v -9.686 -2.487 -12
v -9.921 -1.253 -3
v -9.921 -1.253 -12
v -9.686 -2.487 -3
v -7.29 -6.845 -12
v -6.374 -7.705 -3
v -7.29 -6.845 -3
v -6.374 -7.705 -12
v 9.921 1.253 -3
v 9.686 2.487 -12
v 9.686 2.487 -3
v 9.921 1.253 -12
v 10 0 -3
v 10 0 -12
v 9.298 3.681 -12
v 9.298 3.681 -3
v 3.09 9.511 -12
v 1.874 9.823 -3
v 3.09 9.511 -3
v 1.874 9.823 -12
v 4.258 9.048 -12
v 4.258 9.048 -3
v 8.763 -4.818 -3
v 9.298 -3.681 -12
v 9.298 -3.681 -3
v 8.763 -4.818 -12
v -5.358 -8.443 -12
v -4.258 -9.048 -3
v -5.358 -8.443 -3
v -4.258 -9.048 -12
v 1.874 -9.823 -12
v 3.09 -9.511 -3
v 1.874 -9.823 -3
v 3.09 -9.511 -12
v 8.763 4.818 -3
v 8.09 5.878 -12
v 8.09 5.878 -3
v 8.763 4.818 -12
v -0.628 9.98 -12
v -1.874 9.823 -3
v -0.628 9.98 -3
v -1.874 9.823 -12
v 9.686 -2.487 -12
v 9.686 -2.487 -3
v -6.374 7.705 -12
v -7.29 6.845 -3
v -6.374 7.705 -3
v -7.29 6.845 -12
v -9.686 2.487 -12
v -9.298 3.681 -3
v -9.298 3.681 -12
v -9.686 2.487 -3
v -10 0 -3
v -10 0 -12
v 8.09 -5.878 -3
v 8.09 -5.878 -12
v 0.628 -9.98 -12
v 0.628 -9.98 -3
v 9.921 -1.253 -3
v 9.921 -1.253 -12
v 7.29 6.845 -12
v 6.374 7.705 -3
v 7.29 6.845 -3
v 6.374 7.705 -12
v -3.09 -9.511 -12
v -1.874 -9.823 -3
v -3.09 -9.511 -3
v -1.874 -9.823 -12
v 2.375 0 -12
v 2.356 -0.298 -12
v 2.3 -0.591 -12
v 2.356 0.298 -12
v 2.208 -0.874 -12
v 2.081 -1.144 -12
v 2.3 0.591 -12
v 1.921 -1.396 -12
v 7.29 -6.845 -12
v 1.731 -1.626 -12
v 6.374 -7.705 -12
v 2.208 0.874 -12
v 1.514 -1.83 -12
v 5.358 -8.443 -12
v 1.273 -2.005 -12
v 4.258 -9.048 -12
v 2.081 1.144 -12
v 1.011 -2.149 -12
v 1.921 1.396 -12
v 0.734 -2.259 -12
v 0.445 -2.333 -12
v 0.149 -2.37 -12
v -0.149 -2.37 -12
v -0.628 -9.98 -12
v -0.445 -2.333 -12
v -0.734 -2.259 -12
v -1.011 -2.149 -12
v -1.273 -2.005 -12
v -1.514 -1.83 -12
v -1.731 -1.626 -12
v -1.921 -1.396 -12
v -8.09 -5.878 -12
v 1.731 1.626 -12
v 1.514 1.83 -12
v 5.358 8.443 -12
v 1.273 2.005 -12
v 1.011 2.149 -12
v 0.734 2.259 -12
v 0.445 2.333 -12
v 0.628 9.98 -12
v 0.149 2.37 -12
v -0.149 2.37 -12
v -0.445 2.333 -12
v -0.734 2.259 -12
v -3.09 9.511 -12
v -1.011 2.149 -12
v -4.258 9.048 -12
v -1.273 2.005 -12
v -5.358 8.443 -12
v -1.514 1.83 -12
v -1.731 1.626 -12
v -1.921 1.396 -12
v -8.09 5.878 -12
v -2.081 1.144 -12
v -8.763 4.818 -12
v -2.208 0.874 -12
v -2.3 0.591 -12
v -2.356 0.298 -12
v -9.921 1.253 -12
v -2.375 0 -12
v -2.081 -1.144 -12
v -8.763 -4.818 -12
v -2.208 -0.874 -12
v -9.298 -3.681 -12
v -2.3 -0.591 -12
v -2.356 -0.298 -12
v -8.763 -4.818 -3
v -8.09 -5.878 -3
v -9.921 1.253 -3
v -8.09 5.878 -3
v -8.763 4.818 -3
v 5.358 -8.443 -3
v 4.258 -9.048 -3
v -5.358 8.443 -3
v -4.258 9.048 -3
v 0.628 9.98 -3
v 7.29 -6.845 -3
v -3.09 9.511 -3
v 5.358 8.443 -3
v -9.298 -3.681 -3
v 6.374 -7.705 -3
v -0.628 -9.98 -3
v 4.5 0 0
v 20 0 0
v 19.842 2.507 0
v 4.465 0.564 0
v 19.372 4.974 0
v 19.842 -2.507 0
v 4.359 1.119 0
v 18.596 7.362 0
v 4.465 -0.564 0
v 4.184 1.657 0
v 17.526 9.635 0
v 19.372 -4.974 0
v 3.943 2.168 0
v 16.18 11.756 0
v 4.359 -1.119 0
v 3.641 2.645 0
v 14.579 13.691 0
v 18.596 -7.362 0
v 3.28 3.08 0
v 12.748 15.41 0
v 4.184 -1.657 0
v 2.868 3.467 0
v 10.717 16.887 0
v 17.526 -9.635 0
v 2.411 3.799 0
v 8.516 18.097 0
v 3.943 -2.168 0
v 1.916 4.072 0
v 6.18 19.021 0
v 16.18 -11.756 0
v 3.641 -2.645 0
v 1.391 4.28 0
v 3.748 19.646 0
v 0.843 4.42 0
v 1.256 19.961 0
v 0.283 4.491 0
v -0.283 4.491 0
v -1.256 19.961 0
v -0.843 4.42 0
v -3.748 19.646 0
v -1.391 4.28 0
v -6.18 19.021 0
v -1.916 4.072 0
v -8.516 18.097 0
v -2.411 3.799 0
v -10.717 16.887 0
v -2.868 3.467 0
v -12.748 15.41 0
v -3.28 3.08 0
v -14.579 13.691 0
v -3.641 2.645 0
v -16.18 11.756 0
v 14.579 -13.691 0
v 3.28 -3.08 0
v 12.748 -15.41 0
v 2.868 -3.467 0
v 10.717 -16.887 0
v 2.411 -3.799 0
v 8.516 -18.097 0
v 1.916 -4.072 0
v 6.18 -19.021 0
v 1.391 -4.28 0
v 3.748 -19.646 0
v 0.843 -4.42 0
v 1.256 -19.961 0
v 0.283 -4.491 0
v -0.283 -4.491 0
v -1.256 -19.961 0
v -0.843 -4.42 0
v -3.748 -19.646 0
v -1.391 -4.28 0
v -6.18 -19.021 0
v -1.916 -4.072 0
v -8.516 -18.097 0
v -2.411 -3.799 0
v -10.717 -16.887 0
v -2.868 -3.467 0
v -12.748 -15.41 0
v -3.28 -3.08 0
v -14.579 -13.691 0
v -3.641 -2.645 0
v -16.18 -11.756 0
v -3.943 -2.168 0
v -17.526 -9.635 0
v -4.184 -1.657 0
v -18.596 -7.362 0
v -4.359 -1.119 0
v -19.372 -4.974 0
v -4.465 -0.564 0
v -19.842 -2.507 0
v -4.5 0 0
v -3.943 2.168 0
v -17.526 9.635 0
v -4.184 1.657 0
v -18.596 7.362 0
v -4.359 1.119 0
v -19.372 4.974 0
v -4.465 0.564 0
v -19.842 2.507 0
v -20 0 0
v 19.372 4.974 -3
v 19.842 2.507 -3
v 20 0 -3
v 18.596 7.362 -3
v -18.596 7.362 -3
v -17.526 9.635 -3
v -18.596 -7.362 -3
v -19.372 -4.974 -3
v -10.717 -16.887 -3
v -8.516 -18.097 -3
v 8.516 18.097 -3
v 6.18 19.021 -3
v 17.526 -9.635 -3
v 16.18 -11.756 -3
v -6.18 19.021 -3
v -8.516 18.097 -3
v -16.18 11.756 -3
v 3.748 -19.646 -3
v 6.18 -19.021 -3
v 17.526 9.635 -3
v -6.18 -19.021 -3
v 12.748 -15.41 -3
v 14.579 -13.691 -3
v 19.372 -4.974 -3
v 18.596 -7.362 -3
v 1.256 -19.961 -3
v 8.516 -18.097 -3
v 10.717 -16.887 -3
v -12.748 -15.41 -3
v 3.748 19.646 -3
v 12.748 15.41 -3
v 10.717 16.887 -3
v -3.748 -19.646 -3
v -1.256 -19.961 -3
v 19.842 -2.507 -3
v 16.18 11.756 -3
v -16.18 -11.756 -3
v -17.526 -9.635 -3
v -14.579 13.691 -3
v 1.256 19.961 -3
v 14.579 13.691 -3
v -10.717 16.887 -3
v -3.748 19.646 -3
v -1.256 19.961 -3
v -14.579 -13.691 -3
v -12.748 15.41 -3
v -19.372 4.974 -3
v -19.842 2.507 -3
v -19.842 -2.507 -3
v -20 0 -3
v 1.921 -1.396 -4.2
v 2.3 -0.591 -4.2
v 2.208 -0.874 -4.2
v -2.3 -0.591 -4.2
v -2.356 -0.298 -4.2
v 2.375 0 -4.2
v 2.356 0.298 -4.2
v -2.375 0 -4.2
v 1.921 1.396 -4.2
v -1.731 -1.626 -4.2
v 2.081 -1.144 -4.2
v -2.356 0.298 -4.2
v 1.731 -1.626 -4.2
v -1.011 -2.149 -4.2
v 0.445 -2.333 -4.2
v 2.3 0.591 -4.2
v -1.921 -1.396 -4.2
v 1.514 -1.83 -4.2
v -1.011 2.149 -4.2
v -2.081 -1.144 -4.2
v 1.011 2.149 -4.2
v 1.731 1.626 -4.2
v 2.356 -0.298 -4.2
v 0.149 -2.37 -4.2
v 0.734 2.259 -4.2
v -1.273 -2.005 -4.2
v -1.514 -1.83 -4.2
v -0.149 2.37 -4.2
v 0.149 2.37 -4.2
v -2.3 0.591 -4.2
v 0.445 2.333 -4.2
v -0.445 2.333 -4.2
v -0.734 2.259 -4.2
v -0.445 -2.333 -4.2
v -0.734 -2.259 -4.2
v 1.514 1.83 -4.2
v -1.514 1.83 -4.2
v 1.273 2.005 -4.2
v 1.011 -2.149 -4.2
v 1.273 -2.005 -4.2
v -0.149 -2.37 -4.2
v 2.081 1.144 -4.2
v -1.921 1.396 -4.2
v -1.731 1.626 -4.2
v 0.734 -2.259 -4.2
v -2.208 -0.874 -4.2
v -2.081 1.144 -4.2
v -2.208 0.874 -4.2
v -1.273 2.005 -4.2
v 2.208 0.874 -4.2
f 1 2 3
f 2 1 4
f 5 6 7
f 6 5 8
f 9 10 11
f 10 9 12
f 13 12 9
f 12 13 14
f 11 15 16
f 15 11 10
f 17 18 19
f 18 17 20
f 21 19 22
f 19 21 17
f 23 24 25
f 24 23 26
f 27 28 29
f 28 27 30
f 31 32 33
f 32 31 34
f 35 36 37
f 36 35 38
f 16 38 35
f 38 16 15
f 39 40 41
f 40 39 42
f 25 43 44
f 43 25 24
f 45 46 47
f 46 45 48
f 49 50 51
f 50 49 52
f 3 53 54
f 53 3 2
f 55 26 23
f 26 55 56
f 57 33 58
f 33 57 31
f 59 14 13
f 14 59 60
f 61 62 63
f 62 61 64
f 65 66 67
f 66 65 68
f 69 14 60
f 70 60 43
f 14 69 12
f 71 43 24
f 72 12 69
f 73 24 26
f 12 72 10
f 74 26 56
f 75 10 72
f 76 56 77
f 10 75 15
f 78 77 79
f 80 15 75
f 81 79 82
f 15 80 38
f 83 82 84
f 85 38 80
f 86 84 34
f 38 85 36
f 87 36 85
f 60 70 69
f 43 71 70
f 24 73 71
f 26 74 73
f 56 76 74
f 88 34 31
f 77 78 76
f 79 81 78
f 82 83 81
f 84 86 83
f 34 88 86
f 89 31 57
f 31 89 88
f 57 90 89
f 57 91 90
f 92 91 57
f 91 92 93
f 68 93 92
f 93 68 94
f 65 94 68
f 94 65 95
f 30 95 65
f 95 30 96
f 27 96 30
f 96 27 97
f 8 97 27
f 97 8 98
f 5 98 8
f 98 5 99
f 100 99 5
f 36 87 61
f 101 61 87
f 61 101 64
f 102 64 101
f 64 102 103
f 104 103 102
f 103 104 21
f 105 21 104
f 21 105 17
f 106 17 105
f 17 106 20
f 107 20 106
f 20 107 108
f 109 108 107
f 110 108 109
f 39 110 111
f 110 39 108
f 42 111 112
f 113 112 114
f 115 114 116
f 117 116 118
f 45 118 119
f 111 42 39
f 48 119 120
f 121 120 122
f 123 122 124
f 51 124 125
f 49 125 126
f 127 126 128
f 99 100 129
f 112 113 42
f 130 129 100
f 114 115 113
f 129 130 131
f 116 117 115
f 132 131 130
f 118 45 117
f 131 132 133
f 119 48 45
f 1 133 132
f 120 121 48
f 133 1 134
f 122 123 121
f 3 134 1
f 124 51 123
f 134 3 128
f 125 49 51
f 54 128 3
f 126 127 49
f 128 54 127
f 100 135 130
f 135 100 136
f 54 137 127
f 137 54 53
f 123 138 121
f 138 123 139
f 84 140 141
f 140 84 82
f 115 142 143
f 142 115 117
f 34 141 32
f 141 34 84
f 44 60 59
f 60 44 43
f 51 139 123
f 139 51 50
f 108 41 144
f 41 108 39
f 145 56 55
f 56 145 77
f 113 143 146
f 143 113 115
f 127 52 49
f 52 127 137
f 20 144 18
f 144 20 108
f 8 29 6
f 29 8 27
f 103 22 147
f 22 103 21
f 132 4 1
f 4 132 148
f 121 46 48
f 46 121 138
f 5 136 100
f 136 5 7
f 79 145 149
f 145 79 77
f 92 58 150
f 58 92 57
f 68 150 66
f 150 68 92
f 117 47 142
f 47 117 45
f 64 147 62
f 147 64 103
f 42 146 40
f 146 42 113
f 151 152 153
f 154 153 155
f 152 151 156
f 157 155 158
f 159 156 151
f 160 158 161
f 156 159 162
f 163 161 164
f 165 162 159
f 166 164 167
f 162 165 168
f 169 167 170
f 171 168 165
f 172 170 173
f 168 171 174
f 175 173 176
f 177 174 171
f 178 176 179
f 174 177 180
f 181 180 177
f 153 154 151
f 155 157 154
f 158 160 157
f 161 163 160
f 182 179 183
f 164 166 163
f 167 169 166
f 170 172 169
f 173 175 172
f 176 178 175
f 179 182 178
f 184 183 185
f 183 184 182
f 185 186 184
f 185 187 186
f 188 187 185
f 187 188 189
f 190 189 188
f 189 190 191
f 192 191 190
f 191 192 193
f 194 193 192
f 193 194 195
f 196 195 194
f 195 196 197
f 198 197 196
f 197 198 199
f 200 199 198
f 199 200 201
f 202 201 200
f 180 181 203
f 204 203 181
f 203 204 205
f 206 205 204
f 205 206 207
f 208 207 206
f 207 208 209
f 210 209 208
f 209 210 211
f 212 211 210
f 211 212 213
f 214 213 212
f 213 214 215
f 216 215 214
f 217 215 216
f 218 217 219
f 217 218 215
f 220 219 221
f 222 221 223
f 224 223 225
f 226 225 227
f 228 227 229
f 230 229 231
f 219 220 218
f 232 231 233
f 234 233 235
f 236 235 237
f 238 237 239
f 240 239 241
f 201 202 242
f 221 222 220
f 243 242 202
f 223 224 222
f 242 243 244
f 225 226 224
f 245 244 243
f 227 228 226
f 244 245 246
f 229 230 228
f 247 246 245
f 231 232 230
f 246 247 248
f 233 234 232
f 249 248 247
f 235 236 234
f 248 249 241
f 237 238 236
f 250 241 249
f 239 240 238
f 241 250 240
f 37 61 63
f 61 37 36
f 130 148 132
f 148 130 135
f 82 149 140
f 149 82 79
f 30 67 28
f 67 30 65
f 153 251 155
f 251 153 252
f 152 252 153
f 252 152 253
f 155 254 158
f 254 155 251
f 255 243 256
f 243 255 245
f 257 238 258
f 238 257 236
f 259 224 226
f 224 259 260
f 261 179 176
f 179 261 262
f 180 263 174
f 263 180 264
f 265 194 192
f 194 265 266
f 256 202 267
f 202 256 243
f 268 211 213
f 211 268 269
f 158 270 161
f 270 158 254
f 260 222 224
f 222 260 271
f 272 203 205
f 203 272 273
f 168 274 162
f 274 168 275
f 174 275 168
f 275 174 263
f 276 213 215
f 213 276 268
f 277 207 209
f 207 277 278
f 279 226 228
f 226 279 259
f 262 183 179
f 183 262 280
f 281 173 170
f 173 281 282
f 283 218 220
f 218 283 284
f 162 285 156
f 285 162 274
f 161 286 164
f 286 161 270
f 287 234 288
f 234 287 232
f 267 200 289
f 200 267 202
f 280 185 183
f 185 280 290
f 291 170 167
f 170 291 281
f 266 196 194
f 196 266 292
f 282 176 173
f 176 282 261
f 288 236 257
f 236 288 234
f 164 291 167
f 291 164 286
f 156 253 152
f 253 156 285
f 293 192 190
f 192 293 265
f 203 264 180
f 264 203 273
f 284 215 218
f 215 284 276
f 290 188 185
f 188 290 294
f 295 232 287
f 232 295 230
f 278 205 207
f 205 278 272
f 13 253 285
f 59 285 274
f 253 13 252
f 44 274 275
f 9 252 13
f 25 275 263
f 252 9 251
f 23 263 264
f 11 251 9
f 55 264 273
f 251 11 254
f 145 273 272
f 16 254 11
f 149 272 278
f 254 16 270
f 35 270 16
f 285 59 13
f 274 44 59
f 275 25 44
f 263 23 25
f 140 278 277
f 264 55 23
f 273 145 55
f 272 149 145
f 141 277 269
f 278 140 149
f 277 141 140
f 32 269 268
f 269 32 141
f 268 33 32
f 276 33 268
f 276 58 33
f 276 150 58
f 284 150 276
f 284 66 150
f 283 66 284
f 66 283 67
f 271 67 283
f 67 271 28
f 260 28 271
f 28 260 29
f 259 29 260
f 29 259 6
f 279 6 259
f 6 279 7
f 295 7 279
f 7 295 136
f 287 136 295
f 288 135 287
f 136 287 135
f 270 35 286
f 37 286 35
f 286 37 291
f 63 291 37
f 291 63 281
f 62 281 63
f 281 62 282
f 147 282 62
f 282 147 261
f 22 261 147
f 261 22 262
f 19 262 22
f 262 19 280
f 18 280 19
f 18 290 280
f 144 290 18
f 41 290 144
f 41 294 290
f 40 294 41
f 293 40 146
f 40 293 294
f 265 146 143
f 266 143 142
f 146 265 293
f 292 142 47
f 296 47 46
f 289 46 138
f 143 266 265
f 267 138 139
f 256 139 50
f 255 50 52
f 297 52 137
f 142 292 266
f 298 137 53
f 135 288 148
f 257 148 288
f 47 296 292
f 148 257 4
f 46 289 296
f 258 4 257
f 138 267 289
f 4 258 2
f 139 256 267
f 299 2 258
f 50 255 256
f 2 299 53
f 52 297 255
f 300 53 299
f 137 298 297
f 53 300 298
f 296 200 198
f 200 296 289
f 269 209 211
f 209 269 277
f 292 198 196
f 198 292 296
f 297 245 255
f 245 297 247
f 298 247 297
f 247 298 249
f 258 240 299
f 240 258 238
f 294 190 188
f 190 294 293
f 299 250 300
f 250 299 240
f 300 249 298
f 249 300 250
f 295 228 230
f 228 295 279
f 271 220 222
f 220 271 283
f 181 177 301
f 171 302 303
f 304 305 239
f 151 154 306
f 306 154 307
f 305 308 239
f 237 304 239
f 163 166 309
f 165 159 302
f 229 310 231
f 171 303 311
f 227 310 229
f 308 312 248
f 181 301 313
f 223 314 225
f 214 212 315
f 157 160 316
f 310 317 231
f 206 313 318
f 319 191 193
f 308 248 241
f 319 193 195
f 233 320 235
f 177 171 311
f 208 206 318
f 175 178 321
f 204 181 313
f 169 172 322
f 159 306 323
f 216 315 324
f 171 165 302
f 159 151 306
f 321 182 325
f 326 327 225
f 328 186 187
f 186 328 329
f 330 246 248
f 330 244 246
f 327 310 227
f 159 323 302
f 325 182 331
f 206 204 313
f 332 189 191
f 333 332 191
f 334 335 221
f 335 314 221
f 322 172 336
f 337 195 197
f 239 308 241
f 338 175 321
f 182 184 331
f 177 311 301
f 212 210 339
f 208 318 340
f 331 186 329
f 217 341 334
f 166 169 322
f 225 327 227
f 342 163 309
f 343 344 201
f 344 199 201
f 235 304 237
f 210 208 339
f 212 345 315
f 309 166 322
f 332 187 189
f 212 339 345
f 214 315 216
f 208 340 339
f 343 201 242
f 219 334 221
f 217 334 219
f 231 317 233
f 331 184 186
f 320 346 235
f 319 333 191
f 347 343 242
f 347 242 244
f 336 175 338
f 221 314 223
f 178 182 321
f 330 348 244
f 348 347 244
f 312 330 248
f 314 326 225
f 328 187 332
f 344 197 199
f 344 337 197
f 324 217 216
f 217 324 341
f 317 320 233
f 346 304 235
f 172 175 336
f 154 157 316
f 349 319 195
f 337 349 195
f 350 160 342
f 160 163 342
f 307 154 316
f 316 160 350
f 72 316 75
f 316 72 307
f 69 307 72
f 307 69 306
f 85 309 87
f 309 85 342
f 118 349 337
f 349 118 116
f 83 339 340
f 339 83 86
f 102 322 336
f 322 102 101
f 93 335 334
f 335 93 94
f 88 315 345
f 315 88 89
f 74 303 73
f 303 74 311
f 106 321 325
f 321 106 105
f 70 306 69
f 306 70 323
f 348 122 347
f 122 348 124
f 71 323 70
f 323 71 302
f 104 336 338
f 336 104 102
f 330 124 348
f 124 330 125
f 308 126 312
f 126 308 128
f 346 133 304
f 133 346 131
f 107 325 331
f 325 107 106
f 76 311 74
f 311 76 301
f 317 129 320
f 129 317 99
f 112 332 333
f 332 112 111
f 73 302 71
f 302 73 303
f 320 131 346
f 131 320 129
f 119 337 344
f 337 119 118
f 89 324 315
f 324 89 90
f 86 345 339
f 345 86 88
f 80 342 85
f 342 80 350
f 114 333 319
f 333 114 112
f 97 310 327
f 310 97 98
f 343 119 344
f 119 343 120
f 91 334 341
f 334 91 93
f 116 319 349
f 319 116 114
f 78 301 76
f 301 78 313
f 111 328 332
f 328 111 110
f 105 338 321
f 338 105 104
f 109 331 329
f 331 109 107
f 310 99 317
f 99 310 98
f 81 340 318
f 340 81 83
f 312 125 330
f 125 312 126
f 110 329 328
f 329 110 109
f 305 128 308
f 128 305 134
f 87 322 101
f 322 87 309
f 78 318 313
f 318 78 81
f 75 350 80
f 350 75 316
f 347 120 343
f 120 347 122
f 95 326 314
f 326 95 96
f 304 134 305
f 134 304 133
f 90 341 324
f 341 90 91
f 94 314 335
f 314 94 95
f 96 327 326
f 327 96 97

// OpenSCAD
$fn = 50;


difference() {
	union() {
		translate(v = [0, 0, -12.0000000000]) {
			cylinder(h = 12, r = 10.0000000000);
		}
		translate(v = [0, 0, -3.0000000000]) {
			cylinder(h = 3, r = 20.0000000000);
		}
	}
	union() {
		translate(v = [0, 0, 0]) {
			rotate(a = [0, 0, 0]) {
				difference() {
					union() {
						#translate(v = [0, 0, -12.0000000000]) {
							cylinder(h = 12, r = 2.2500000000);
						}
						#translate(v = [0, 0, -4.2000000000]) {
							cylinder(h = 4.2000000000, r = 10.0000000000, r1 = 2.3750000000, r2 = 4.5000000000);
						}
						#translate(v = [0, 0, -12.0000000000]) {
							cylinder(h = 12, r = 2.3750000000);
						}
						#translate(v = [0, 0, -12.0000000000]) {
							cylinder(h = 12, r = 2.2500000000);
						}
					}
					union();
				}
			}
		}
	}
}
